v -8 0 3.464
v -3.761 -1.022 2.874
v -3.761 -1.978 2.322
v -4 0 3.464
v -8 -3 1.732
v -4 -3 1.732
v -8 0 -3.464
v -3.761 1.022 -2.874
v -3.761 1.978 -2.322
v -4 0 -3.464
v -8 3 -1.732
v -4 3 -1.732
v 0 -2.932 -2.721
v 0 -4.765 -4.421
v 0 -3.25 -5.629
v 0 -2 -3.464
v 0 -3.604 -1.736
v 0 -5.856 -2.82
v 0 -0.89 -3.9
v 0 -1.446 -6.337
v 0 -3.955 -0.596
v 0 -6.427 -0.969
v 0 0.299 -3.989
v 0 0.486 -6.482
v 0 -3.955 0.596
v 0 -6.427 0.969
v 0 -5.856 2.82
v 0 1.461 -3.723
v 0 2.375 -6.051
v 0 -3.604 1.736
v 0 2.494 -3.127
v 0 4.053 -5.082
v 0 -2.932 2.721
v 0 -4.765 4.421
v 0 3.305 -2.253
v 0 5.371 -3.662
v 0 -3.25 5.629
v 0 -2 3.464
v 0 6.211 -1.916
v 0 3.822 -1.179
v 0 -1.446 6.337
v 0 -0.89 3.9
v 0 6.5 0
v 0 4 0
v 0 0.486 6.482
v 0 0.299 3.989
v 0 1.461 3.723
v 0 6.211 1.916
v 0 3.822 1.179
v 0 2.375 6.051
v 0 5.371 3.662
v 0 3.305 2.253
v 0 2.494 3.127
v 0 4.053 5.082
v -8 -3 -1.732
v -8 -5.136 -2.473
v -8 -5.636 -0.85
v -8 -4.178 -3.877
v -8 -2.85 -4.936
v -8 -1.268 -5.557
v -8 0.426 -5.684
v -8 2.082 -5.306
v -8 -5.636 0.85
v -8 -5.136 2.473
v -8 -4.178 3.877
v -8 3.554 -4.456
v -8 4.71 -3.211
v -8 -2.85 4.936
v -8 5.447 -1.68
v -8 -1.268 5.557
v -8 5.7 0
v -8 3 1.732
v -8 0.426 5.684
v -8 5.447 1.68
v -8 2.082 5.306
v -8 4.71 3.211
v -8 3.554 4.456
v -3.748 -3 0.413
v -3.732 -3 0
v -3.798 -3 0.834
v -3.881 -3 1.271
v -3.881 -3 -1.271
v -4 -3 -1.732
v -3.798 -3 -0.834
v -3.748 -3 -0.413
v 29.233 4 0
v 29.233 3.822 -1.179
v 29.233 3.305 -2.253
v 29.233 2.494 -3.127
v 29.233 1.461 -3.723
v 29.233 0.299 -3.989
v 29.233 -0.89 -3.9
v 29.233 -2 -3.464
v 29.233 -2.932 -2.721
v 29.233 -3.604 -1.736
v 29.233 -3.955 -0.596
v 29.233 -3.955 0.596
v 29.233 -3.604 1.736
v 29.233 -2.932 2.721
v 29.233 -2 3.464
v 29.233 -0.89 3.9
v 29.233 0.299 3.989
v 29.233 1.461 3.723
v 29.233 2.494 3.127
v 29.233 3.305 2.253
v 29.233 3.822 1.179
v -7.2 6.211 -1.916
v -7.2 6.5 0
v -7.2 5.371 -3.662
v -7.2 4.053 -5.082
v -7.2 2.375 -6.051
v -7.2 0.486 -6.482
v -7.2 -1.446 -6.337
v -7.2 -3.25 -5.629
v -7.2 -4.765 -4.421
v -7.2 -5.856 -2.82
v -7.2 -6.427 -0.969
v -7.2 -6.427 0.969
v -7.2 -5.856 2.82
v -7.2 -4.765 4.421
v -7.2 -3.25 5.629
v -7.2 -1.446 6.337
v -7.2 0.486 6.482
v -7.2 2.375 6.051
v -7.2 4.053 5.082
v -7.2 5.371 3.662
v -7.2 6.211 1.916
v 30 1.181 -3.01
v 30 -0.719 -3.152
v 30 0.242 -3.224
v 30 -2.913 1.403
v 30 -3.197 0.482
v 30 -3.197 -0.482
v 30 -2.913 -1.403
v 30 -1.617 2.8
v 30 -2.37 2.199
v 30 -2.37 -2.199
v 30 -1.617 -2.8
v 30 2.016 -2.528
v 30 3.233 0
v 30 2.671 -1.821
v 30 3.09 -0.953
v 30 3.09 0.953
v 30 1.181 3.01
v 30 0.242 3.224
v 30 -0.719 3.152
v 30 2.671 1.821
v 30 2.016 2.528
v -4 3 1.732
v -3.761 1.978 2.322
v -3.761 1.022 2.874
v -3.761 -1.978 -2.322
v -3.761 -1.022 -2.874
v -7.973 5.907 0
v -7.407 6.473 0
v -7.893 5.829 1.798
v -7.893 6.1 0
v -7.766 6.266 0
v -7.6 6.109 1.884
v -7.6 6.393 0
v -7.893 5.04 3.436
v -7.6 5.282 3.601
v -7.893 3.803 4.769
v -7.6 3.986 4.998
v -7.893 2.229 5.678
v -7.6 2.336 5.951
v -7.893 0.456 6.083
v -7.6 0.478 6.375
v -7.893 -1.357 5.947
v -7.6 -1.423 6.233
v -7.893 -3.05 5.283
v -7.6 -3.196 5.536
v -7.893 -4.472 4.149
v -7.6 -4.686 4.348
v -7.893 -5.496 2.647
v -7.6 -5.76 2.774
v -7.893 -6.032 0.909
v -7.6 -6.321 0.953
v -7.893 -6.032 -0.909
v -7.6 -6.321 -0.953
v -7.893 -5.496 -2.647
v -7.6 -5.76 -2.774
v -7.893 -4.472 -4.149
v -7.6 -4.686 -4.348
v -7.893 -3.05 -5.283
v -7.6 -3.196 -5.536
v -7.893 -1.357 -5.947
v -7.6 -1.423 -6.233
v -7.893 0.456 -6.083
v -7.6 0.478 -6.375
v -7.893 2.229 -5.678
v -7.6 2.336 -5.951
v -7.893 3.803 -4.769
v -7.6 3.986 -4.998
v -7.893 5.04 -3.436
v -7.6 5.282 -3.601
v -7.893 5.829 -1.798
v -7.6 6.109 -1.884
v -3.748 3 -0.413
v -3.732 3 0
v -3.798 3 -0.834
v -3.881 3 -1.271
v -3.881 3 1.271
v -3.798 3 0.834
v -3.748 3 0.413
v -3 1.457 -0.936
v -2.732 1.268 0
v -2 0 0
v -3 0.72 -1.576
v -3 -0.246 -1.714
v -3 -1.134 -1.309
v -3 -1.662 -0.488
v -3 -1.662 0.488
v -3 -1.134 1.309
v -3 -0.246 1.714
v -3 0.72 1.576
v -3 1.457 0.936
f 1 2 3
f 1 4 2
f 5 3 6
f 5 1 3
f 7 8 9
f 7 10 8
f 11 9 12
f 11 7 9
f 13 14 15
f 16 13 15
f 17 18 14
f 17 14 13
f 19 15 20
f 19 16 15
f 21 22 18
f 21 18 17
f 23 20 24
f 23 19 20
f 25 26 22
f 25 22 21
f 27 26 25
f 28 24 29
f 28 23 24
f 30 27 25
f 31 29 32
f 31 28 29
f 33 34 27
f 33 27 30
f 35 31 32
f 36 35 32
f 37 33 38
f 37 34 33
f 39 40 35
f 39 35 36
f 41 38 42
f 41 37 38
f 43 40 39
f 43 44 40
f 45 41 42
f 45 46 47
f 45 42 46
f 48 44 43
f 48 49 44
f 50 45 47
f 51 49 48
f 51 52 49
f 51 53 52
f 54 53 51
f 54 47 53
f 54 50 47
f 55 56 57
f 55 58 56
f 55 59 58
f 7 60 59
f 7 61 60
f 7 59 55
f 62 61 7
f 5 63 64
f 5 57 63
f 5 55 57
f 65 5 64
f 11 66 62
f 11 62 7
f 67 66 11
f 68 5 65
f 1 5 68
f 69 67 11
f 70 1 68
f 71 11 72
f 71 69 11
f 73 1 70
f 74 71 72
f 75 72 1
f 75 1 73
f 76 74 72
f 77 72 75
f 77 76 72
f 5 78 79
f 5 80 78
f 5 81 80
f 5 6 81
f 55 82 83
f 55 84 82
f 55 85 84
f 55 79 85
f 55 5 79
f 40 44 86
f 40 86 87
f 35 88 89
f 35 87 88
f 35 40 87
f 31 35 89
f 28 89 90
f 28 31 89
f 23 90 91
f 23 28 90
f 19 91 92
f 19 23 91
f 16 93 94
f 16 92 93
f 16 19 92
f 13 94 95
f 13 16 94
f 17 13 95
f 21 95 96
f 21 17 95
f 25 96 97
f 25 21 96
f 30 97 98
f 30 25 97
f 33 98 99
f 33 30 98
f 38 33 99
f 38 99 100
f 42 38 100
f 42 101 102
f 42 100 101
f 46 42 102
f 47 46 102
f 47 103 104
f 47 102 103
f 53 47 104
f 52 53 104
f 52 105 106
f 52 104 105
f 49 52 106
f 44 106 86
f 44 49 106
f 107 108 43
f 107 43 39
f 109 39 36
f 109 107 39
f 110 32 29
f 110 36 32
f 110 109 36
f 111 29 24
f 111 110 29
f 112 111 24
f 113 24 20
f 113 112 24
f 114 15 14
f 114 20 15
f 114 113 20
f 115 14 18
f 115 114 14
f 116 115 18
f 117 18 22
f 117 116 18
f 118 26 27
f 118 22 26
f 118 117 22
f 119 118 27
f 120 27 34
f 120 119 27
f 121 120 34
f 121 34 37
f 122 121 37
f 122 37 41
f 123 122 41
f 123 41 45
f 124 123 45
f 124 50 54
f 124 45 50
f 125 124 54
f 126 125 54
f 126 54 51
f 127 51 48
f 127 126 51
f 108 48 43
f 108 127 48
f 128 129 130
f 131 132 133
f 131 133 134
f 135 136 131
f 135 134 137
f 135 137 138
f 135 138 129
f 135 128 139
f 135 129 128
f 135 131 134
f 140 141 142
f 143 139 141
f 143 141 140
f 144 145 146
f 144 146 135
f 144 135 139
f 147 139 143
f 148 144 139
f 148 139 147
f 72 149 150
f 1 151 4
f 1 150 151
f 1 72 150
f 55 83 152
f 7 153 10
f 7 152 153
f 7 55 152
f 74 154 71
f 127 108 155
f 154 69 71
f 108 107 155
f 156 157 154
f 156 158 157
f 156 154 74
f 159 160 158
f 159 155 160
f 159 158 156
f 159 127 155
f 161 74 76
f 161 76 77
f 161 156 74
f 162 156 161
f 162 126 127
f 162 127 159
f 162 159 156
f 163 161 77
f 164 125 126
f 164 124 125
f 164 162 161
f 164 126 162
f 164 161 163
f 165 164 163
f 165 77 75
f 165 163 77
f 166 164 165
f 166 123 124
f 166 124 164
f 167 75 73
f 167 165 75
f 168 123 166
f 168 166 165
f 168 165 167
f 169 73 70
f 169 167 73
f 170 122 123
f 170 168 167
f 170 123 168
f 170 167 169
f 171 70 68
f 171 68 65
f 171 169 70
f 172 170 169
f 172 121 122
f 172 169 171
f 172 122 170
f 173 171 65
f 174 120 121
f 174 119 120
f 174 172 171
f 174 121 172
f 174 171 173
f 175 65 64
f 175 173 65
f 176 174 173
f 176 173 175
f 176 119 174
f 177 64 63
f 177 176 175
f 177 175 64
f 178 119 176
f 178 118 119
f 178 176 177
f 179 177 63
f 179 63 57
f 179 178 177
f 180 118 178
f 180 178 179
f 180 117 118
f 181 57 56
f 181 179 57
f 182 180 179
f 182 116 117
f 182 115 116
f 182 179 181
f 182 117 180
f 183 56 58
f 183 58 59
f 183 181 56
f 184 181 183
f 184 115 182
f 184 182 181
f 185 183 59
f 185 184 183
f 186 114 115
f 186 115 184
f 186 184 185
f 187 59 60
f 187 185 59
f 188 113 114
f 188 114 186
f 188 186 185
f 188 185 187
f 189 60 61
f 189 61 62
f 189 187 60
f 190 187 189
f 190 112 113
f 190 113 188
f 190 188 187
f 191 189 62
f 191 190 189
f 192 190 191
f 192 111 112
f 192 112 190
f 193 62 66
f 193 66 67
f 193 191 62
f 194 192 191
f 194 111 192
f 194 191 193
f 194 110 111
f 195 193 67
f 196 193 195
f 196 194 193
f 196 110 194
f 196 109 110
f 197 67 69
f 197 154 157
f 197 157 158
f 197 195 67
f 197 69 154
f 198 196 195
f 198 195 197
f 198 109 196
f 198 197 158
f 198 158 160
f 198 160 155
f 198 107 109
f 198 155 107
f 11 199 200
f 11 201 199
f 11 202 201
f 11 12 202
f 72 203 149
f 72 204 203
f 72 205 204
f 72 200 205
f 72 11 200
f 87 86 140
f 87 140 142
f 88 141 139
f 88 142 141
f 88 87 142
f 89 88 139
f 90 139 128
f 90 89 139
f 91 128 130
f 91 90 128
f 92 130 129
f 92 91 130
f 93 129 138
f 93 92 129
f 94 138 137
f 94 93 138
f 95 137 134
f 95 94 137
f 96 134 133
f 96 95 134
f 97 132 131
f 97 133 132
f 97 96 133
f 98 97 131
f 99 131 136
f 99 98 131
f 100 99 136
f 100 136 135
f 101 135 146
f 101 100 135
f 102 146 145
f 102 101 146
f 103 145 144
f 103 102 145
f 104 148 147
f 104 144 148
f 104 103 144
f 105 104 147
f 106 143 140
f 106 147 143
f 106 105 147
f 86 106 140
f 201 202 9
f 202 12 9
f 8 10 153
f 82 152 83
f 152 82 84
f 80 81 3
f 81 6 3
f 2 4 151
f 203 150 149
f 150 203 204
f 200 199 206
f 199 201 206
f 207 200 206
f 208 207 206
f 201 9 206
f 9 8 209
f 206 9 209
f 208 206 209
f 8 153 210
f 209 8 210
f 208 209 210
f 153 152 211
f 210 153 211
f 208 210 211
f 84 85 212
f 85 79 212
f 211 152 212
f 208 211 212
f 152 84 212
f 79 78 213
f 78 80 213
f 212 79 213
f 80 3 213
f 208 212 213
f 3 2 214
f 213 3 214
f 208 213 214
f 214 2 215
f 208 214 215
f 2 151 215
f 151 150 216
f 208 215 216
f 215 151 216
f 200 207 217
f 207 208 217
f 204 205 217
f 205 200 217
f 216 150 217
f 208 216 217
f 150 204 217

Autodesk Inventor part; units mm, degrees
ref_plane "YZ Plane" through (0, 0, 0) normal (1, 0, 0) x (0, 1, 0)
ref_plane "XZ Plane" through (0, 0, 0) normal (0, 1, 0) x (-1, 0, 0)
sketch "Sketch1" plane through (0, 0, 0) normal (0, 0, 1) x (1, 0, 0)
  line L0 (-2, 0) -> (30, 0)
  line L1 (30, 0) -> (30, 4)
  line L2 (30, 4) -> (3.125, 4)
  line L3 (3.125, 4) -> (2.3581, 4)
  line L4 (2.3581, 4) -> (0, 4)
  line L5 (0, 4) -> (0, 6.5)
  line L6 (0, 6.5) -> (-8, 6.5)
  line L7 (-8, 6.5) -> (-8, 3.4641)
  line L8 (-8, 3.4641) -> (-4, 3.4641)
  line L9 (-4, 3.4641) -> (-2, 0)
  line L10 (-11.8, 0) -> (41.4, 0) projected
  line L11 (0, -0.65) -> (0, 8.45) projected
  line L12 (3.125, 4) -> (0, 4) construction
  dimension "d1" = 26.875
  dimension "d2" = 0.7669
  dimension "d3" = 8
  dimension "d4" = 4
  dimension "d5" = 60
  dimension "d6" = 8
  dimension "d7" = 8
  dimension "d8" = 6.9282
  dimension "d9" = 13
  dimension "d26" = 30
revolve "Body" add sketch "Sketch1" angle 360 about axis through (-2, 0, 0) along (1, 0, 0)
sketch "Sketch2" plane through (-8, 0, 0) normal (-1, 0, 0) x (0, 0, 1)
  circle A0 centre (0, 0) radius 3.4641 projected
  line L0 (0, -7.8) -> (0, 10.4) projected
  line L1 (-7.8, 0) -> (10.4, 0) projected
  line L2 (3.4641, 0) -> (1.7321, -3)
  line L3 (1.7321, -3) -> (-1.7321, -3)
  line L4 (-1.7321, -3) -> (-3.4641, 0)
  line L5 (-3.4641, 0) -> (-1.7321, 3)
  line L6 (-1.7321, 3) -> (1.7321, 3)
  line L7 (1.7321, 3) -> (3.4641, 0)
extrude "Slot" add sketch "Sketch2" against normal up to next contours L7 A0 | A0 L2 | L6 L0 A0 | A0 L0 L3 | L0 L6 A0 | A0 L3 L0 | L4 A0 | A0 L5
fillet "Fillet1" radius 0.8 1 edges at (-8, -6.5, 0)
thread "Thread" size "M8x1.25" class "6g" standard "ISO Metric profile" length 26.875
chamfer "Chamfer1" distance 0.7668 distance2 0.7668 1 edges at (30, -4, 0) measured on face at (30, -0.4013, -0.6579)
ref_plane "Work Plane1" through (29, 0, 0) normal (0, -1, 0) x (1, 0, 0)
equation "\"d1\" = GEL"
equation "\"d3\" = KOH"
equation "\"d4\" = INTI"
equation "\"d6\" = GD"
equation "\"d7\" = BDM"
equation "\"d8\" = 1.1547 * SW"
equation "\"d9\" = KOD"
equation "\"d26\" = NLG"
equation "\"d17\" = RR"
equation "\"d13\" = GEL"
equation "\"d15\" = -0.5 * SPD + 0.5 * GD"
equation "\"d16\" = GUL"
equation "\"GD\" = 8"
equation "\"NLG\" = 30"
equation "\"GEL\" = 26.875"
equation "\"KOD\" = 13"
equation "\"KOH\" = 8"
equation "\"INTI\" = 4"
equation "\"GAL\" = 0.61345 * PTC"
equation "\"GUL\" = 0.61345 * PTC"
equation "\"BDM\" = NND"
equation "\"SW\" = 6"
equation "\"RR\" = 0.8"
equation "\"SPD\" = NND - 1.2269 * PTC"
equation "\"TOA\" = 30deg"
equation "\"GD1\" = THREADDIA - 1.2269 * PTC"
equation "\"THREADDIA\" = 8"
equation "\"FAWI\" = 45deg"
equation "\"PTC\" = 1.25"
equation "\"NND\" = 8"
equation "\"E0\" = 1.155 * SW"
properties part number "100001" material "Steel, Mild"
